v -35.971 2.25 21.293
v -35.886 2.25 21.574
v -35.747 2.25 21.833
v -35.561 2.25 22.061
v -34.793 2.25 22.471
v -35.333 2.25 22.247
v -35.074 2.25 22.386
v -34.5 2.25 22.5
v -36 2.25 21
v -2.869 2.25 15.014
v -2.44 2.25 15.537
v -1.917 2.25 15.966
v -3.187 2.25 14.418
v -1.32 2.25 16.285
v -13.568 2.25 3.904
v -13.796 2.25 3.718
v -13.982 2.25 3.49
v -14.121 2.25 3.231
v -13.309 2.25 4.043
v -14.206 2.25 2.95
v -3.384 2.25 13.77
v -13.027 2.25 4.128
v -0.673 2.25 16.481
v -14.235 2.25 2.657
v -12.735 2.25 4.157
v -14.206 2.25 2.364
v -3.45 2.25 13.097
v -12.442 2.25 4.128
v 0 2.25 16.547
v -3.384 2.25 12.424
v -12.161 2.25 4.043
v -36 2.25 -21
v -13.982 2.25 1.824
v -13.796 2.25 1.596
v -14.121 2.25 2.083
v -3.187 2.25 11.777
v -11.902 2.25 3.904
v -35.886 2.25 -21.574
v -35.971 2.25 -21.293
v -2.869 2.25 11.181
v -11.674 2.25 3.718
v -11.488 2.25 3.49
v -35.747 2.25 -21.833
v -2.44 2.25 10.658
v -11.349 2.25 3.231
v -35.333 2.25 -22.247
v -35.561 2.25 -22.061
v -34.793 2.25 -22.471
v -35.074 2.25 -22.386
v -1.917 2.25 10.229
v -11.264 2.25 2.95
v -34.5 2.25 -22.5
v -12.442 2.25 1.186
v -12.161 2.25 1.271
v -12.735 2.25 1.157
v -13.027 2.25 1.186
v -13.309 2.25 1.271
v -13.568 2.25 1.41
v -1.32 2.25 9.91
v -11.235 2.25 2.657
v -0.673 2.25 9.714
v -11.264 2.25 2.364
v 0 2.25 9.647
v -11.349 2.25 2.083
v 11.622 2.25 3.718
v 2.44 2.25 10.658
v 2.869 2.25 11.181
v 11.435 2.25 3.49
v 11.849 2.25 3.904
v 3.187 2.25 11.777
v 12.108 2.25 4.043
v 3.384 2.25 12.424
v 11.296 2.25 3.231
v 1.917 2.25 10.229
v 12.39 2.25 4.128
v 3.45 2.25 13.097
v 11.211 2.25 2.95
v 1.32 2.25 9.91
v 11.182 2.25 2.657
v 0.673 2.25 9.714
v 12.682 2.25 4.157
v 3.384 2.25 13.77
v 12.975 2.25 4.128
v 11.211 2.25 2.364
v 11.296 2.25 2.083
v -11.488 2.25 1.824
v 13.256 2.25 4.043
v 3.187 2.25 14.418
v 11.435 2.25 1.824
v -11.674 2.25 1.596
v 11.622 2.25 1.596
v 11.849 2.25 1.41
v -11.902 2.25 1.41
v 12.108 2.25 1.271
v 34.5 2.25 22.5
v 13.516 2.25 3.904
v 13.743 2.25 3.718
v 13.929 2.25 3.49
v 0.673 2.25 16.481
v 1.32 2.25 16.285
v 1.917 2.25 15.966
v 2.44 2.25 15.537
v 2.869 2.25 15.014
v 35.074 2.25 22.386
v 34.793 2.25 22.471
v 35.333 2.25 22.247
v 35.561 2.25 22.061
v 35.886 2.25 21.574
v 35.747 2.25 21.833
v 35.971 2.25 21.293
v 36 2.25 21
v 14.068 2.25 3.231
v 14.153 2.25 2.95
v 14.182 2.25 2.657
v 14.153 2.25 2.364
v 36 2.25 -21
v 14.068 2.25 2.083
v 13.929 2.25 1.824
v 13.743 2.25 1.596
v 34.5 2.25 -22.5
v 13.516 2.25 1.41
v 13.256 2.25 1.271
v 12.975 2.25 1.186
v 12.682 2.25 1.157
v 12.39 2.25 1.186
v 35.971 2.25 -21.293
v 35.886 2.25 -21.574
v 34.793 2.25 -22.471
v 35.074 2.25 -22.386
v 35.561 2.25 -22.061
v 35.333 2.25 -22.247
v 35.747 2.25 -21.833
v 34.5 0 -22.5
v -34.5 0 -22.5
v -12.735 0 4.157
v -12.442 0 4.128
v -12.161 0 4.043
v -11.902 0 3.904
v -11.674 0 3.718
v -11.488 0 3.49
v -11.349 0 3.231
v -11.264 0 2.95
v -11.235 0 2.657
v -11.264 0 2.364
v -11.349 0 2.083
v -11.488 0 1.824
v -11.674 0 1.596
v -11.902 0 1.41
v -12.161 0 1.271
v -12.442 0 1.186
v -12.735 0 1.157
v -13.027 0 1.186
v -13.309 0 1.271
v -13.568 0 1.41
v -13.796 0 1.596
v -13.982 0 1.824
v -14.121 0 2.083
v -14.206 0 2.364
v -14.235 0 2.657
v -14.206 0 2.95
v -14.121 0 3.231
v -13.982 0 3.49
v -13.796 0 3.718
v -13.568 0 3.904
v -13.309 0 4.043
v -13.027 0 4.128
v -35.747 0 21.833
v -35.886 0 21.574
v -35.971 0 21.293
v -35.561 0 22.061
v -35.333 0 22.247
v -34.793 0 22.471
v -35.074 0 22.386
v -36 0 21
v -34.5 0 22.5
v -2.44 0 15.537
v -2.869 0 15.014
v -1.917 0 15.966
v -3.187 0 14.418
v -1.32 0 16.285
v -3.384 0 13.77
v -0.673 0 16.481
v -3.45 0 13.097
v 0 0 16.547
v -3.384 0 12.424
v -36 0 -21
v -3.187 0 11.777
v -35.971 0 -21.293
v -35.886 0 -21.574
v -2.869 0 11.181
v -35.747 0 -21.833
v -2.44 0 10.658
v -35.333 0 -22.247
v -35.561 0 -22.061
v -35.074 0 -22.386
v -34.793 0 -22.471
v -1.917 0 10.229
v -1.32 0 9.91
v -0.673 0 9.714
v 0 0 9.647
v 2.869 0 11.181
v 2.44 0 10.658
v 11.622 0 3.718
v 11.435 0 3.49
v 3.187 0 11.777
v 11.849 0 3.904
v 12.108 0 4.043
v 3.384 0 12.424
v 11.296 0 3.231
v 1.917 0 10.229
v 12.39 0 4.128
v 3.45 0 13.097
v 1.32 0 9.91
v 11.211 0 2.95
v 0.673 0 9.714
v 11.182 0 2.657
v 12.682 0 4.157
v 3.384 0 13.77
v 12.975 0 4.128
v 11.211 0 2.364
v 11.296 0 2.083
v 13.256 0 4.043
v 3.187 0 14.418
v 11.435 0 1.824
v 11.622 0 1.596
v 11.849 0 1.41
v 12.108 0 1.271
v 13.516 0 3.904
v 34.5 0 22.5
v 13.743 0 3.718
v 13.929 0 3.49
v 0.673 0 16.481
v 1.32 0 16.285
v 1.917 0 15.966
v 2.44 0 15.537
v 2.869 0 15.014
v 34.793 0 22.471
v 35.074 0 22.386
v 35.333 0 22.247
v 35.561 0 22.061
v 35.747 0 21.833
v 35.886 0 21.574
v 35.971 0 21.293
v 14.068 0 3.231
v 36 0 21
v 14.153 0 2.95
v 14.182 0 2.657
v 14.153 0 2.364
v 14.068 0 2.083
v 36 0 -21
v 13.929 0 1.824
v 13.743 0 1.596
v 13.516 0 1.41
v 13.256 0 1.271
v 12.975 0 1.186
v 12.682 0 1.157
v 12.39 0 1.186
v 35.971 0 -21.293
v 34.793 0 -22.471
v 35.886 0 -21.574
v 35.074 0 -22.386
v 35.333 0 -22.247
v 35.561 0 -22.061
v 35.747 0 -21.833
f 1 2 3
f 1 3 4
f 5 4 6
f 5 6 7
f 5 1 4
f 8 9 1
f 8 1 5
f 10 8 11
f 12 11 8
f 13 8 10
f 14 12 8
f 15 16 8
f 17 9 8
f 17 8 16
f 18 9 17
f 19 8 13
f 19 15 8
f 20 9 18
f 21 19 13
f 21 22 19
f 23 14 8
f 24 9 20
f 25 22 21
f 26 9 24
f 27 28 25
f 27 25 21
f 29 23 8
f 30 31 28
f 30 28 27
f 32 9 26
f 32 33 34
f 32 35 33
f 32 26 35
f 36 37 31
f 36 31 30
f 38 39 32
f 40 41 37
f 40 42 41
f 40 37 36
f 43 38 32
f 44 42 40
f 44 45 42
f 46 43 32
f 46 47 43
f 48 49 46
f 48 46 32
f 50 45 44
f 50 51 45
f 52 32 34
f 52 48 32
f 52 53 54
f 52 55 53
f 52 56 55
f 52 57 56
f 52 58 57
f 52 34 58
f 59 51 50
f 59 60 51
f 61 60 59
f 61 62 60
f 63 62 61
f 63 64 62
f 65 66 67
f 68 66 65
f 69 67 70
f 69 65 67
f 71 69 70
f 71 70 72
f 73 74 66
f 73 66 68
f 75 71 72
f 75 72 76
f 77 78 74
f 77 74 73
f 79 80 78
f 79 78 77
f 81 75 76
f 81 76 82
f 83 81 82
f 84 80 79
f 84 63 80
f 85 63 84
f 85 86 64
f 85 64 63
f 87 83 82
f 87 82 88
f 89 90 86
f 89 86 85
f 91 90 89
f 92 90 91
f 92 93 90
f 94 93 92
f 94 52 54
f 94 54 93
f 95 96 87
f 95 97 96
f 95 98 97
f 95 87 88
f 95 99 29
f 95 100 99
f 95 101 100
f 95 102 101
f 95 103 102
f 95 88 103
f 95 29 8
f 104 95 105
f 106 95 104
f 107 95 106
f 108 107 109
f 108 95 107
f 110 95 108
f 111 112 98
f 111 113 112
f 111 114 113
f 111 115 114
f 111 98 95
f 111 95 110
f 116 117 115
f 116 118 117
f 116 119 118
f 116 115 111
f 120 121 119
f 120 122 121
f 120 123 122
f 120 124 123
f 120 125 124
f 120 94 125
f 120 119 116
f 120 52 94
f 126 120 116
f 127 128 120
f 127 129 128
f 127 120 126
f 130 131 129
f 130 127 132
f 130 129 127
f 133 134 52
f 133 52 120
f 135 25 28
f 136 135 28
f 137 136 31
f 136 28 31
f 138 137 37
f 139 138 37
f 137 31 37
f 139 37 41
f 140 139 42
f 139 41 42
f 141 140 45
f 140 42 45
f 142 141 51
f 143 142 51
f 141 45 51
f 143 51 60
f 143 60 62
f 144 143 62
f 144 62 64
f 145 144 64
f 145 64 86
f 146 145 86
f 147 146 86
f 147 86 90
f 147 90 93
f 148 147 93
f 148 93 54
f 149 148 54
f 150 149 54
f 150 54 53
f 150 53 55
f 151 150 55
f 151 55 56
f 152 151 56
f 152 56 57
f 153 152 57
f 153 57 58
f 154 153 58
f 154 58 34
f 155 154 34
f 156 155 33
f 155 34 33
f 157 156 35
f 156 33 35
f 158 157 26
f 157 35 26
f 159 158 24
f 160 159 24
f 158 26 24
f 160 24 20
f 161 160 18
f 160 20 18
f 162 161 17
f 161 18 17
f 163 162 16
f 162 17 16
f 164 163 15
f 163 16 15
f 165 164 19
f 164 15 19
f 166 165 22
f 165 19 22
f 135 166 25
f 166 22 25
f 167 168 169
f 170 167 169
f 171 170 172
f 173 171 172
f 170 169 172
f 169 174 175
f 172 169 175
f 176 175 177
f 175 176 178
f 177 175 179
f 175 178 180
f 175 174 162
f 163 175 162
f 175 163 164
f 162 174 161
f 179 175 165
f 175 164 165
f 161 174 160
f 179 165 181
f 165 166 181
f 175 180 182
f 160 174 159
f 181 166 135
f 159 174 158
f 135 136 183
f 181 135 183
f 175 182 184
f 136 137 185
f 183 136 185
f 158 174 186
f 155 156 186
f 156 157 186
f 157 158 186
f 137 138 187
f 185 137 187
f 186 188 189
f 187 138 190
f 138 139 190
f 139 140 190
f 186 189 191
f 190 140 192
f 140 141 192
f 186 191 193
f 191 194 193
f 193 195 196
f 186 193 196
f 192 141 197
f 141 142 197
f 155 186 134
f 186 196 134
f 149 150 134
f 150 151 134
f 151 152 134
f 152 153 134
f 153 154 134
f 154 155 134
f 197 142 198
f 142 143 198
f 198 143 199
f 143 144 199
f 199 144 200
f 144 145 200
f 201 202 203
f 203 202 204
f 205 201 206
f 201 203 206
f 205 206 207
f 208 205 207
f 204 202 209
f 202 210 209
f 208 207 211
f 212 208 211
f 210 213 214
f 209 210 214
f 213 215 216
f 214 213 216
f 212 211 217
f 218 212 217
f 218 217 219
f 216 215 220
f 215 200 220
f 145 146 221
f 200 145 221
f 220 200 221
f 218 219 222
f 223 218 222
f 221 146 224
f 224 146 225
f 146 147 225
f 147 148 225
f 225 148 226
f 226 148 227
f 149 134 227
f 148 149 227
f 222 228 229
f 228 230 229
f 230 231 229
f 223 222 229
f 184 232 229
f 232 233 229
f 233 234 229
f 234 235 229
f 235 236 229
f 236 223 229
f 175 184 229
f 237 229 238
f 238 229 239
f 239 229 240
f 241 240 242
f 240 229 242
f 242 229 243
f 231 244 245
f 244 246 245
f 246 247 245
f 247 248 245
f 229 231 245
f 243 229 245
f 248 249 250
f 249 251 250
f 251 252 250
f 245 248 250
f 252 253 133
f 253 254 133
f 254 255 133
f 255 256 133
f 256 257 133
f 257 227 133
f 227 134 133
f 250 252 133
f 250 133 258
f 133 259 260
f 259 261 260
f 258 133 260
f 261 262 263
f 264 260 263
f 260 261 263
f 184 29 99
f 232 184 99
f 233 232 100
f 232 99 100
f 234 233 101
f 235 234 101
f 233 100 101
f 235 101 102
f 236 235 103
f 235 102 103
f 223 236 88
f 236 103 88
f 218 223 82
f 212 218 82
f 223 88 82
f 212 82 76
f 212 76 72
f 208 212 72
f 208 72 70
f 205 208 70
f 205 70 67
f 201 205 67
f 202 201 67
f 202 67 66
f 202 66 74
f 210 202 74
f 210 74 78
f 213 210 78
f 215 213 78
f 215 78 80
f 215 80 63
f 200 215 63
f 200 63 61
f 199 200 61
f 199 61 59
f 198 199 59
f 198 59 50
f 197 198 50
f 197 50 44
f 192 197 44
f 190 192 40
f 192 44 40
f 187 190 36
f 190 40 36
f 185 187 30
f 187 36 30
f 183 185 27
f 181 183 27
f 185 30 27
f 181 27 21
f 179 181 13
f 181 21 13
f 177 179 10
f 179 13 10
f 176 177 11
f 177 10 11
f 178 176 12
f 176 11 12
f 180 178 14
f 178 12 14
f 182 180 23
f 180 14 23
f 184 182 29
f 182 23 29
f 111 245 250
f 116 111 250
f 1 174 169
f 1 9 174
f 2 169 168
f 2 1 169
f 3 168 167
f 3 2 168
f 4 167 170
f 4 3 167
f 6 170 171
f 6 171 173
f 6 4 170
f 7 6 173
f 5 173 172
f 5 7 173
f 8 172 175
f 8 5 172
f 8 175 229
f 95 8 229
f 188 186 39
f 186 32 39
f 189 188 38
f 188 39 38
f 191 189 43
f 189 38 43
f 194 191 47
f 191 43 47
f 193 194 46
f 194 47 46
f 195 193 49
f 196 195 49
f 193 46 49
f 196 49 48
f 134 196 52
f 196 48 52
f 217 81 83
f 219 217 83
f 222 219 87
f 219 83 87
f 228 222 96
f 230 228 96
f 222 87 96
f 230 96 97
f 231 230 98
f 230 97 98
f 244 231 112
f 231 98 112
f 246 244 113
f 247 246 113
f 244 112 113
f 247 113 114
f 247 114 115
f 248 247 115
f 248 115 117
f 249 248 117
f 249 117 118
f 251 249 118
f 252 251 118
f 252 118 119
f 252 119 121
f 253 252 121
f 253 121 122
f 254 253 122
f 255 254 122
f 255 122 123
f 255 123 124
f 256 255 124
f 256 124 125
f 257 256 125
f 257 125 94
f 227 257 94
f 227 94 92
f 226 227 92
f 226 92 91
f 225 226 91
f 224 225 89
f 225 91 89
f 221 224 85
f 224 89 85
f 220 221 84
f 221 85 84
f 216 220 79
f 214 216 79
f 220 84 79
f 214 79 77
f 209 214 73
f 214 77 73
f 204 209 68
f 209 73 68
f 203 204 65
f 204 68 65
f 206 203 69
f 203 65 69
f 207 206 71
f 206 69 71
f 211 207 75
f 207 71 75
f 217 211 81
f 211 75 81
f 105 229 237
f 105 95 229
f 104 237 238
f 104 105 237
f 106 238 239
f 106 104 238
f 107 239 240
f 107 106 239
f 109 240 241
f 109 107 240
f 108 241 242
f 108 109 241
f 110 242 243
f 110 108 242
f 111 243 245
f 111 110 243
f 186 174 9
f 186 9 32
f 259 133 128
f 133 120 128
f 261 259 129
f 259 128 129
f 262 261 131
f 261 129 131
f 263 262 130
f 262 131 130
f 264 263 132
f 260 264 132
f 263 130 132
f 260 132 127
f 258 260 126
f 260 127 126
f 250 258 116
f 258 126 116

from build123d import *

# Parameters (mm, degrees)
SKETCH1_W           = 72
SKETCH1_H           = 45
BOSS_EXTRUDE1_DEPTH = 2.25
FILLET2_R           = 1.5
FILLET3_R           = 1.5
SKETCH16_R          = 3.45
CUT_EXTRUDE1_DEPTH  = 10
SKETCH18_R          = 1.5
CUT_EXTRUDE2_DEPTH  = 10


with BuildPart() as part:
    # Sketch1 → Boss-Extrude1 (new body)
    with BuildSketch(Plane(origin=(0, 0, 0), x_dir=(1, 0, 0), z_dir=(0, 1, 0))):
        Rectangle(SKETCH1_W, SKETCH1_H)
    extrude(amount=BOSS_EXTRUDE1_DEPTH)

    # Fillet2
    fillet2_edges = [part.edges().sort_by_distance(p)[0] for p in [
        (-36, 1.125, -22.5),
    ]]
    fillet(fillet2_edges, radius=FILLET2_R)

    # Fillet3
    fillet3_edges = [part.edges().sort_by_distance(p)[0] for p in [
        (36, 1.125, 22.5),
        (-36, 1.125, 22.5),
        (36, 1.125, -22.5),
    ]]
    fillet(fillet3_edges, radius=FILLET3_R)

    # Sketch16 → Cut-Extrude1 (cut)
    with BuildSketch(Plane(origin=(0, 2.25, 0), x_dir=(1, 0, 0), z_dir=(0, 1, 0))):
        with Locations(Location((0, -13.097290255, 0), (0, 0, 270))):
            Circle(SKETCH16_R)
    extrude(amount=-CUT_EXTRUDE1_DEPTH, mode=Mode.SUBTRACT)

    # Sketch18 → Cut-Extrude2 (cut)
    with BuildSketch(Plane(origin=(0, 2.25, 0), x_dir=(1, 0, 0), z_dir=(0, 1, 0))):
        with Locations(Location((-12.734859634, -2.656879133, 0), (0, 0, 270))):
            Circle(SKETCH18_R)
        with Locations(Location((12.682272565, -2.656879133, 0), (0, 0, 270))):
            Circle(SKETCH18_R)
    extrude(amount=-CUT_EXTRUDE2_DEPTH, mode=Mode.SUBTRACT)


solid = part.part
